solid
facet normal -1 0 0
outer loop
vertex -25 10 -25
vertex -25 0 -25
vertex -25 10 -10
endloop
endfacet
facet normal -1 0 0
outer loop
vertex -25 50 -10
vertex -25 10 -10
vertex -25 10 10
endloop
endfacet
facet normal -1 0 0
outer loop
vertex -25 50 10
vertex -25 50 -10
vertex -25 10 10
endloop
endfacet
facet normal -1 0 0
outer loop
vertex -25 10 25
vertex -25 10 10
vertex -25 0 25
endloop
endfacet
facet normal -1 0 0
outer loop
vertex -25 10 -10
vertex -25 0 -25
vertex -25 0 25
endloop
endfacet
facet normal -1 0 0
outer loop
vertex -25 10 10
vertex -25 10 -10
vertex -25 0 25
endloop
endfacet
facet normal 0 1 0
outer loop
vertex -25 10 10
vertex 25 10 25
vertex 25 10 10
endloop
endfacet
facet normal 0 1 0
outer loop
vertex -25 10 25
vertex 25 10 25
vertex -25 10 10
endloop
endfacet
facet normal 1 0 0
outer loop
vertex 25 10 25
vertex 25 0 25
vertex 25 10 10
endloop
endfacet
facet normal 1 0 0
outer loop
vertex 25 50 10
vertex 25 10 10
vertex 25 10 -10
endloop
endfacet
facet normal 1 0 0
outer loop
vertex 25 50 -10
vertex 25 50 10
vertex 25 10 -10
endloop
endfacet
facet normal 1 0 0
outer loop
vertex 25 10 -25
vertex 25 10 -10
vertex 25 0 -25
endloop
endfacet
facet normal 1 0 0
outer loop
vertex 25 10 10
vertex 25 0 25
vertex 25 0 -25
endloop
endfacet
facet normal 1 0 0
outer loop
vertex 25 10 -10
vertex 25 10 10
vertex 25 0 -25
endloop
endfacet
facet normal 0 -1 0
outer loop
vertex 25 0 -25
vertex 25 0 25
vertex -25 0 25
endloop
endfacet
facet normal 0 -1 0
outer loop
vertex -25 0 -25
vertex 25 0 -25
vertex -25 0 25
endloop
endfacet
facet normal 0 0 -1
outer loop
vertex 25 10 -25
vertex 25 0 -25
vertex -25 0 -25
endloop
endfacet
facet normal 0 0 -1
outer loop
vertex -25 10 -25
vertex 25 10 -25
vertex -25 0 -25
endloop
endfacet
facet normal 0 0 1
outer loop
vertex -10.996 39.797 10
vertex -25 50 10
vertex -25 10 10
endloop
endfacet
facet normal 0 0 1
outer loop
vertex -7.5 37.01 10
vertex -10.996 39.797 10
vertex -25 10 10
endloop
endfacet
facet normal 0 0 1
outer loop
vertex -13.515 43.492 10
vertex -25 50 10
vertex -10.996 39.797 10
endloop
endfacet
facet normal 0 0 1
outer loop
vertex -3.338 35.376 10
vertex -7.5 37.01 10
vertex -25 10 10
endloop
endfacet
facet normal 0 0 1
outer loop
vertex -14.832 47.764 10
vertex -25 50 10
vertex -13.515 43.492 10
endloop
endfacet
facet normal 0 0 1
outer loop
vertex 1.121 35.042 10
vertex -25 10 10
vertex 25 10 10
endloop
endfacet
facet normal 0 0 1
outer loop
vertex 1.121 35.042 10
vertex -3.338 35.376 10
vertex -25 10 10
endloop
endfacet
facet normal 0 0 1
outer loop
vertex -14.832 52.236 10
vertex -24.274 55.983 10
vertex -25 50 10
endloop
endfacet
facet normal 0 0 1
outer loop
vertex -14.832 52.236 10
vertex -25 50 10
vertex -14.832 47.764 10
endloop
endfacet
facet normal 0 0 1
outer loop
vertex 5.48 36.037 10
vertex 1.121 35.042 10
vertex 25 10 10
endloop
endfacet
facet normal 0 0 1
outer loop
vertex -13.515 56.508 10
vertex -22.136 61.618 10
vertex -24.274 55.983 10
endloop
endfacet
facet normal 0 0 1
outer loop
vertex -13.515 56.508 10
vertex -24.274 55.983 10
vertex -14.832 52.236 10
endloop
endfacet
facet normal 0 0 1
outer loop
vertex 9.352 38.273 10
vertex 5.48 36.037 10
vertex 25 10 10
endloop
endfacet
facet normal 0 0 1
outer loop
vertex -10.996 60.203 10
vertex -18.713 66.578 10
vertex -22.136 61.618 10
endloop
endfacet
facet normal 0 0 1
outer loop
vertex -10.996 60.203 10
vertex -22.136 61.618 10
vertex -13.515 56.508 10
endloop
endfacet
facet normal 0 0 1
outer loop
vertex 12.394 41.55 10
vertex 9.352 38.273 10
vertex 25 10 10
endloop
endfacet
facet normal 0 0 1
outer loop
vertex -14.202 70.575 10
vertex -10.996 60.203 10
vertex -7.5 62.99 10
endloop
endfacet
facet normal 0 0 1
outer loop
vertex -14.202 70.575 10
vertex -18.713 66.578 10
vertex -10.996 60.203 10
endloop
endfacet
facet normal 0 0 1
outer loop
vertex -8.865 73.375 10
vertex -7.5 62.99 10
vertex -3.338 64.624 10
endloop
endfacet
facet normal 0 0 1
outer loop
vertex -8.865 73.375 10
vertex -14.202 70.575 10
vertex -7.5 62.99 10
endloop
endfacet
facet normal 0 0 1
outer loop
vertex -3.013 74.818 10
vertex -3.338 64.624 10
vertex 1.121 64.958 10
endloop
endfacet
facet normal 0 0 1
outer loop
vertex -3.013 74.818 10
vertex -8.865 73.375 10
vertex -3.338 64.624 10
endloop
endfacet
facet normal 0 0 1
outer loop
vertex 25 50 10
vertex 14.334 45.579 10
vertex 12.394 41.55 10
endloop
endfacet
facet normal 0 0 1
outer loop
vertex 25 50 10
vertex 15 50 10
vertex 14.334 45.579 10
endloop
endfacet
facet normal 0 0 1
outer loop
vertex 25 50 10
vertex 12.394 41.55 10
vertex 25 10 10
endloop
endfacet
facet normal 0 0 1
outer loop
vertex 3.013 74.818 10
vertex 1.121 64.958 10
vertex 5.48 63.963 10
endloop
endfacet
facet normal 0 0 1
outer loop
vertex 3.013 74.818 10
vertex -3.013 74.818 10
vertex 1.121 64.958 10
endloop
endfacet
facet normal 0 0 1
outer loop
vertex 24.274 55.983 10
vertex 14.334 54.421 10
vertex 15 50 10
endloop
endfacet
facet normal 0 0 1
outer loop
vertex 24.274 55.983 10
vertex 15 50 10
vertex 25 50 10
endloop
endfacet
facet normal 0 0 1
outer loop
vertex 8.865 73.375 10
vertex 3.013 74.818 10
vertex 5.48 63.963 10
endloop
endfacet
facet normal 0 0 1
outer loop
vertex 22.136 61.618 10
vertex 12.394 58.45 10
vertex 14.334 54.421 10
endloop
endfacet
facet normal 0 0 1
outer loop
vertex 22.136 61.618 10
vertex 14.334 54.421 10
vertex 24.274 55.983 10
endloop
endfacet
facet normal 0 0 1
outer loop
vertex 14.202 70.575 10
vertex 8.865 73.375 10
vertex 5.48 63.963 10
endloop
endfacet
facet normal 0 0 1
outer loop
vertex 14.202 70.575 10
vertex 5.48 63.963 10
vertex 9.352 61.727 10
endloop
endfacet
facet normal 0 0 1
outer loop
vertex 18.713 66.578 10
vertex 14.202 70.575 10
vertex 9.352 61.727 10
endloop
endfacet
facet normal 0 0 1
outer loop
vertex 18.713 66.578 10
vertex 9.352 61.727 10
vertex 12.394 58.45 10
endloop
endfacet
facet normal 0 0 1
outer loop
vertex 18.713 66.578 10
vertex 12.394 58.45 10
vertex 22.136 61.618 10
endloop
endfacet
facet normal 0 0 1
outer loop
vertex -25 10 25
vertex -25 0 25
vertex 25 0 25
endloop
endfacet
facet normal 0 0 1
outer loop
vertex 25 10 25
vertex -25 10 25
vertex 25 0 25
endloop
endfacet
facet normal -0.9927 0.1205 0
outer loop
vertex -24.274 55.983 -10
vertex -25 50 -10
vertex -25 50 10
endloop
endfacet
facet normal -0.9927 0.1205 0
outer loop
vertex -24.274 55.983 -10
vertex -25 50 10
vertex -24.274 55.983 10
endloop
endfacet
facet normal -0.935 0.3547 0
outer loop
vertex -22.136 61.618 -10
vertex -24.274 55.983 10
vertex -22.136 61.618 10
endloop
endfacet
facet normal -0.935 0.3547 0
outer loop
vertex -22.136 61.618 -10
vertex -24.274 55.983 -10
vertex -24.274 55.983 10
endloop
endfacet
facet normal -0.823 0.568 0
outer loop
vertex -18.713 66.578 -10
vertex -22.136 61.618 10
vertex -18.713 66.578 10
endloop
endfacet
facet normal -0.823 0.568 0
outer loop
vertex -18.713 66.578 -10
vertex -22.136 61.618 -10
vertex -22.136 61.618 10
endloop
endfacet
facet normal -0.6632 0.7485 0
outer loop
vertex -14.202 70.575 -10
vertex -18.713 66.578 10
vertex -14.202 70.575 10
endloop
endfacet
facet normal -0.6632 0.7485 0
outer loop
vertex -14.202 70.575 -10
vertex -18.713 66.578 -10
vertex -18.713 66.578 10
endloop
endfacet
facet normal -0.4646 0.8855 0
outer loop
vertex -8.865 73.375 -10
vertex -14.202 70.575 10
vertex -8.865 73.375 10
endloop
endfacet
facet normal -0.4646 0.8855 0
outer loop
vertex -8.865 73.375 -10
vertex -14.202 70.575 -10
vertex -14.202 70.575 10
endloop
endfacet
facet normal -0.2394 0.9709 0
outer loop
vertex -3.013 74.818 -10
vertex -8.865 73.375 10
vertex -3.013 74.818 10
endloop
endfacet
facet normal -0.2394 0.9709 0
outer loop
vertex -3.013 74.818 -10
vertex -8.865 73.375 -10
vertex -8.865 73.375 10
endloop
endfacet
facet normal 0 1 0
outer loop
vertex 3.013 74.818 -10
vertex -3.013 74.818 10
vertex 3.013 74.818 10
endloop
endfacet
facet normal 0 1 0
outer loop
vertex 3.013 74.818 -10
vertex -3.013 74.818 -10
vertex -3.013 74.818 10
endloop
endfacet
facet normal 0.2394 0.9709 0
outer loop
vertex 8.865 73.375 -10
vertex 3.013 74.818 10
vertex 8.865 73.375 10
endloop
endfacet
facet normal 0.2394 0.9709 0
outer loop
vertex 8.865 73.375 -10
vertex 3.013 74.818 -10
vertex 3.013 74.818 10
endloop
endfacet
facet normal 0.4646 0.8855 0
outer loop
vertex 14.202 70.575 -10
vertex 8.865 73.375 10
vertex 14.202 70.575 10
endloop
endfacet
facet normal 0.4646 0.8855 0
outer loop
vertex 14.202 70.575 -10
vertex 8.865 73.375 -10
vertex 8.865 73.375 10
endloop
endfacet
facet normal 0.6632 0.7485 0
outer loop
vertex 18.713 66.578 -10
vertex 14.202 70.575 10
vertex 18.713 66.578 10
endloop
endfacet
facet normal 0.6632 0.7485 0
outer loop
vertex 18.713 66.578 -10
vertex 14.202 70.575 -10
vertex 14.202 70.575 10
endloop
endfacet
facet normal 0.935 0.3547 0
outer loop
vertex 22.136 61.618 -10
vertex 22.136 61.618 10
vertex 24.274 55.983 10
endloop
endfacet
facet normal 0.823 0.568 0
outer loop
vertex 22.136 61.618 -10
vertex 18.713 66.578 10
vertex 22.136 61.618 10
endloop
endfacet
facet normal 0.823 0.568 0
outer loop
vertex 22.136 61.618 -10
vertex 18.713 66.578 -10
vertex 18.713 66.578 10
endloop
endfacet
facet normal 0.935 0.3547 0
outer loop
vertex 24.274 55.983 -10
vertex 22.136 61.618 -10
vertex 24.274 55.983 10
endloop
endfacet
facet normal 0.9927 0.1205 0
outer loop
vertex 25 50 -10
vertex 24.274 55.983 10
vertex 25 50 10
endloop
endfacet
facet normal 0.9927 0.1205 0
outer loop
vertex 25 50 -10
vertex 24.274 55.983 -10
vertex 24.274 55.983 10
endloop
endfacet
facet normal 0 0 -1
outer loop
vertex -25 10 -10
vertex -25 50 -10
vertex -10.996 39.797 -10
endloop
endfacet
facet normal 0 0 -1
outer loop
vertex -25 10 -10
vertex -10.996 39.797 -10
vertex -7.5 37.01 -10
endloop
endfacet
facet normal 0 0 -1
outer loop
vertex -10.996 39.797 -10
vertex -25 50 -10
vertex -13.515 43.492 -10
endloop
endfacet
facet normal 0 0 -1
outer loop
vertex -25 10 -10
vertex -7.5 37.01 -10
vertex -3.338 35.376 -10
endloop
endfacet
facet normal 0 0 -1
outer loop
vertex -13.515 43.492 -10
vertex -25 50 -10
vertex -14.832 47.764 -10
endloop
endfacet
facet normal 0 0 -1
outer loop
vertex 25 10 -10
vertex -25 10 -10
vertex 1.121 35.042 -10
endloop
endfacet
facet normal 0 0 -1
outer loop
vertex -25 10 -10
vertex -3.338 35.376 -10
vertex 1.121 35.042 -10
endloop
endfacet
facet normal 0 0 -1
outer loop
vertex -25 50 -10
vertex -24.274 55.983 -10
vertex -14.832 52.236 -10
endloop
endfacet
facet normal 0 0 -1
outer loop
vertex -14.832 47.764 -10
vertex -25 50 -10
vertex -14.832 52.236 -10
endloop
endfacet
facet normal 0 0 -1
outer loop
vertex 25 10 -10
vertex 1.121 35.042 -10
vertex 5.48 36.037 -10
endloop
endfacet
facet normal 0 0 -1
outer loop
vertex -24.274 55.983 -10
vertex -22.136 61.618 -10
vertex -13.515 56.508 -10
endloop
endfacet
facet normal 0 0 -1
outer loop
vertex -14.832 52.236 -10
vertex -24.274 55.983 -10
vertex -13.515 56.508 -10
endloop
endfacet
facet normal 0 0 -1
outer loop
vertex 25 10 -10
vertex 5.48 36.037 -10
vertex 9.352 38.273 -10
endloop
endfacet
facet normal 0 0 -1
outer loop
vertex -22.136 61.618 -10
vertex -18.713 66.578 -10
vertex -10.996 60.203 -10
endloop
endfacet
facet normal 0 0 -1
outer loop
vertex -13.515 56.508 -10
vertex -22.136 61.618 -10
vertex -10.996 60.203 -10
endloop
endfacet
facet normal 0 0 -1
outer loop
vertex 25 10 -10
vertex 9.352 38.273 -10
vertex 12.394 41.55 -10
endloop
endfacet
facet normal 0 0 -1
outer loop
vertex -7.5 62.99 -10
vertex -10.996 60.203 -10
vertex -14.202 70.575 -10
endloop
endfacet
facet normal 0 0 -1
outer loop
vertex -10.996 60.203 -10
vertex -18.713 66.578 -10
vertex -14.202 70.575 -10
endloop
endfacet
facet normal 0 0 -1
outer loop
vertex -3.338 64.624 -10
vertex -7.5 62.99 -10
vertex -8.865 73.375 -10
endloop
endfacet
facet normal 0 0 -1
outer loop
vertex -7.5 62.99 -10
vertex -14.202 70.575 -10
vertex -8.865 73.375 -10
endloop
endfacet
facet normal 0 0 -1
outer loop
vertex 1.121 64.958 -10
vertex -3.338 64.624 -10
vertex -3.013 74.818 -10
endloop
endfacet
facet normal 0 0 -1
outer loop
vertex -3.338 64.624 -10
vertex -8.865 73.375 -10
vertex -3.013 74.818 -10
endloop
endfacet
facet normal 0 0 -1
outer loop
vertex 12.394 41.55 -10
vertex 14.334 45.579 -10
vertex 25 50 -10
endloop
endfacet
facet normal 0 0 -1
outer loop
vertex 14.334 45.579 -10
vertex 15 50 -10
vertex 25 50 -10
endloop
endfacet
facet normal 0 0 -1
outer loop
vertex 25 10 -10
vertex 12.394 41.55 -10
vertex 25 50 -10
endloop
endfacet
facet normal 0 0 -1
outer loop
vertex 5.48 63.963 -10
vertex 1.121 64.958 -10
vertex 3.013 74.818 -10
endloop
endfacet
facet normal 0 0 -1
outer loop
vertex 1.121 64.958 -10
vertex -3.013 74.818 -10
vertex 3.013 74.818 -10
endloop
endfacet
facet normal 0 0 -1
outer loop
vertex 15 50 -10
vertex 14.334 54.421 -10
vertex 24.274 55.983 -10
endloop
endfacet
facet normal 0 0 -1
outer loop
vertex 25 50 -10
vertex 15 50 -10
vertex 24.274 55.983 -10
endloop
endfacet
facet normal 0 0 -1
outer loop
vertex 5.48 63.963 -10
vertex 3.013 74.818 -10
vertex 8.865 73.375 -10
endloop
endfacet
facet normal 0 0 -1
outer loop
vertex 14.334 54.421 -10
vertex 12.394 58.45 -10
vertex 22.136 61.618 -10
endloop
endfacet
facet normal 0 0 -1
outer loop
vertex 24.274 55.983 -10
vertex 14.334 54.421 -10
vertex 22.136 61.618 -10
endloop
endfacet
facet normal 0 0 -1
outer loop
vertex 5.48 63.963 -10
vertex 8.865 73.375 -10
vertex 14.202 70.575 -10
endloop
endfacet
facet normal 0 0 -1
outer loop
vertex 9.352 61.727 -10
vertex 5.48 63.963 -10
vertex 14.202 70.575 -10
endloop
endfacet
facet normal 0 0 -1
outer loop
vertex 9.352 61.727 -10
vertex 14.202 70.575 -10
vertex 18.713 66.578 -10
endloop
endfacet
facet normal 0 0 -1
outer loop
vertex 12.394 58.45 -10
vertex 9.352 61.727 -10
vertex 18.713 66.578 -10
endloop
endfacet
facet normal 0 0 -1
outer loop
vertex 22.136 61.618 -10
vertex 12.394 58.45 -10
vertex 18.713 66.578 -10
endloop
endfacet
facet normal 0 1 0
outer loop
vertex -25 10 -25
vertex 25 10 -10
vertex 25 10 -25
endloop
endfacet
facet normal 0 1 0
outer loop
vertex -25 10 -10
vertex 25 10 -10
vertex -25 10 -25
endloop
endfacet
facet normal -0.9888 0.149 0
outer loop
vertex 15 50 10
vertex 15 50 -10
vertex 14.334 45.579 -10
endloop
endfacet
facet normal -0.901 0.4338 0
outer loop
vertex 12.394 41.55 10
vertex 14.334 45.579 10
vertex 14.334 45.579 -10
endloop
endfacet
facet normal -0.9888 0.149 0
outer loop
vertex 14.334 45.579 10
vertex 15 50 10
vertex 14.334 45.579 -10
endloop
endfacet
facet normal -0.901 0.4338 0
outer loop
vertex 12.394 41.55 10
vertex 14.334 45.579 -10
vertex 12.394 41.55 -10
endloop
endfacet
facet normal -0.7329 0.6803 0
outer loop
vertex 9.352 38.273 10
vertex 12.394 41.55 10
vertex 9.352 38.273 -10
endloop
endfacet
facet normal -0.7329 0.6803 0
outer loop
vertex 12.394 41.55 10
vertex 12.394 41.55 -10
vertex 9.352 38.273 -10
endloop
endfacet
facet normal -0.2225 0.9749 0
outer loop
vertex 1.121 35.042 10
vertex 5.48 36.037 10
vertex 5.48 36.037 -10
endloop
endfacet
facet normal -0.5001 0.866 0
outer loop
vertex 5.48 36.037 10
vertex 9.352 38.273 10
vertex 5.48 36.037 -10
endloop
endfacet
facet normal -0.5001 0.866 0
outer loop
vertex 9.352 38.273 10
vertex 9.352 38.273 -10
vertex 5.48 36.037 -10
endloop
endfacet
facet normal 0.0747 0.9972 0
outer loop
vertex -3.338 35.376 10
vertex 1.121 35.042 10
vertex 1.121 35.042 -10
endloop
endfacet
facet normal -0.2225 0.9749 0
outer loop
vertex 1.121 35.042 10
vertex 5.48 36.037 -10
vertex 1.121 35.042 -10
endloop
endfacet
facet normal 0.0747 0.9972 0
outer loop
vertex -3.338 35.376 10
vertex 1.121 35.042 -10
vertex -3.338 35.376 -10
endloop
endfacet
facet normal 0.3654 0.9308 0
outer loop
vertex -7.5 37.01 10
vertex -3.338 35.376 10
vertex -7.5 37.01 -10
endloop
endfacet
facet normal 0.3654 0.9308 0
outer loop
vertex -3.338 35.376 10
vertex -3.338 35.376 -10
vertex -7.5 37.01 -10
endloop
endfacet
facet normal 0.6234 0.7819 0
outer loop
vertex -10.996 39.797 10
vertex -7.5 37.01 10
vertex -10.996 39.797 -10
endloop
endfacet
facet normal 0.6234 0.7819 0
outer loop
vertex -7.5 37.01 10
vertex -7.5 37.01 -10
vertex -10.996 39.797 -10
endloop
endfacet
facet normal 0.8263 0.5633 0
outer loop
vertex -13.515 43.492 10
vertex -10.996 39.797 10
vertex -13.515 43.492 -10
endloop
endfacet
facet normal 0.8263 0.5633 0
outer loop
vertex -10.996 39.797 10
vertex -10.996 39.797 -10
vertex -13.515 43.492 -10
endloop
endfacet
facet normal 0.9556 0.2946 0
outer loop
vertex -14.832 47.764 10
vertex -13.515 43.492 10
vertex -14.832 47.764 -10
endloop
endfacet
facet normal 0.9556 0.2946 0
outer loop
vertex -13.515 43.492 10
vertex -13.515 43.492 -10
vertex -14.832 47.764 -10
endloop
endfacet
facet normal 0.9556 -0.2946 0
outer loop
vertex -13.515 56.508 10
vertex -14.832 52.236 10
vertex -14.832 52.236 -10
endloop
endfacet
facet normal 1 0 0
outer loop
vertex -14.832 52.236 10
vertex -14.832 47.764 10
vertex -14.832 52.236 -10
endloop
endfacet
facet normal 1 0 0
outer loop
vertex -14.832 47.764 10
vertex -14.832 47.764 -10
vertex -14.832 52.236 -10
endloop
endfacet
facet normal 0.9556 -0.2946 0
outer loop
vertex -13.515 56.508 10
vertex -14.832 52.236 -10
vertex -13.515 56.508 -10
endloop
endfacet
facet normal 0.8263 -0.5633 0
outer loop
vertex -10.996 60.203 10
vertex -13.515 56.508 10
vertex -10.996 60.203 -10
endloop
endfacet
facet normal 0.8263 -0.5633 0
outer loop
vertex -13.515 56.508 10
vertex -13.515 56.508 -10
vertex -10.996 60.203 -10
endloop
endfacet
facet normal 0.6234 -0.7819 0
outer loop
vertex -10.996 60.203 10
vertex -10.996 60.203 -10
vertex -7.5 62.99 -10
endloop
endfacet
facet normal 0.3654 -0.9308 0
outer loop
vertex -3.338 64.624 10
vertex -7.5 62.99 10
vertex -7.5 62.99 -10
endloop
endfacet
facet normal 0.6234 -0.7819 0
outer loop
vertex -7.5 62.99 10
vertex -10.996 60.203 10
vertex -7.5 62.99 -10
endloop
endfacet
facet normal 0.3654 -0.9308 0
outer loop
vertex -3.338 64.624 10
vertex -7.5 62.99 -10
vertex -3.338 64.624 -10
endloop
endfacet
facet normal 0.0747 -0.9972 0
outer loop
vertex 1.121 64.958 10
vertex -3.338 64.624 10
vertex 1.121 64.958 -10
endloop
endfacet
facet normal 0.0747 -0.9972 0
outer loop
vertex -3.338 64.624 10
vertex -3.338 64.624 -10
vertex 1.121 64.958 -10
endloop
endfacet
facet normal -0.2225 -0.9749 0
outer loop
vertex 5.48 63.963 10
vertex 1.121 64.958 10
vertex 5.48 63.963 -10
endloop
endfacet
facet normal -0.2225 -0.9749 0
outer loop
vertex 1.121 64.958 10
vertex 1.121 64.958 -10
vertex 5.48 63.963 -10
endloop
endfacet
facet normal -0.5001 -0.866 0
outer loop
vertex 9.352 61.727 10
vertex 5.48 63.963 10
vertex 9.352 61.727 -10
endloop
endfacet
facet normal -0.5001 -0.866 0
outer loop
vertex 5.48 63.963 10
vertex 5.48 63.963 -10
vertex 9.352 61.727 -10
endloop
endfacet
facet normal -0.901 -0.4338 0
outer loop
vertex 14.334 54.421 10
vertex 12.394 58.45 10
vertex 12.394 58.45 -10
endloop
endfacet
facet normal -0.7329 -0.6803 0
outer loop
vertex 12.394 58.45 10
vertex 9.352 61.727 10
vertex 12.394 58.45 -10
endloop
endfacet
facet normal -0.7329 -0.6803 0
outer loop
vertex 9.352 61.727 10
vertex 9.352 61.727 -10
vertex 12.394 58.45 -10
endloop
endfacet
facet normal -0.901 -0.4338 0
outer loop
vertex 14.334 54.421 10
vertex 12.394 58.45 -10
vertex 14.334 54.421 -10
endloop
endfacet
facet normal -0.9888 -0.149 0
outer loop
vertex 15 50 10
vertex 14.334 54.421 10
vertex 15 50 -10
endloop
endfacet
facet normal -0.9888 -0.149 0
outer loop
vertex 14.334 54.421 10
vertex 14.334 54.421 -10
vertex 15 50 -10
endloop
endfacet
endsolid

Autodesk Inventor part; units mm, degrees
ref_plane "YZ Plane" through (0, 0, 0) normal (1, 0, 0) x (0, 1, 0)
ref_plane "XZ Plane" through (0, 0, 0) normal (0, 1, 0) x (-1, 0, 0)
ref_plane "XY Plane" through (0, 0, 0) normal (0, 0, 1) x (1, 0, 0)
sketch "Sketch1" plane through (0, 0, 0) normal (0, 1, 0) x (-1, 0, 0)
  line L0 (25, 25) -> (-25, 25)
  line L1 (-25, 25) -> (-25, -25)
  line L2 (-25, -25) -> (25, -25)
  line L3 (25, -25) -> (25, 25)
  line L4 (25, 25) -> (-25, -25) construction
  line L5 (-25, 25) -> (25, -25) construction
  point P0 (0, 0)
  dimension "d0" = 50
  dimension "d1" = 50
extrude "Extrusion1" add sketch "Sketch1" along normal blind 10
sketch "Sketch3" plane through (0, 0, 0) normal (0, 0, 1) x (1, 0, 0)
  circle A0 centre (0, 50) radius 25
  circle A1 centre (0, 50) radius 15
  line L0 (-25, 0) -> (25, 0) projected
  line L1 (25, 10) -> (-25, 10) projected
  line L2 (-25, 50) -> (-25, 10)
  line L3 (-25, 10) -> (25, 10)
  line L4 (25, 10) -> (25, 50)
  point P0 (0, 0)
  point P1 (0, 0)
  dimension "d4" = 30
  dimension "d5" = 50
  dimension "d6" = 50
extrude "Extrusion2" add sketch "Sketch3" along normal mid plane 20
properties part number "Manipulator Base"
